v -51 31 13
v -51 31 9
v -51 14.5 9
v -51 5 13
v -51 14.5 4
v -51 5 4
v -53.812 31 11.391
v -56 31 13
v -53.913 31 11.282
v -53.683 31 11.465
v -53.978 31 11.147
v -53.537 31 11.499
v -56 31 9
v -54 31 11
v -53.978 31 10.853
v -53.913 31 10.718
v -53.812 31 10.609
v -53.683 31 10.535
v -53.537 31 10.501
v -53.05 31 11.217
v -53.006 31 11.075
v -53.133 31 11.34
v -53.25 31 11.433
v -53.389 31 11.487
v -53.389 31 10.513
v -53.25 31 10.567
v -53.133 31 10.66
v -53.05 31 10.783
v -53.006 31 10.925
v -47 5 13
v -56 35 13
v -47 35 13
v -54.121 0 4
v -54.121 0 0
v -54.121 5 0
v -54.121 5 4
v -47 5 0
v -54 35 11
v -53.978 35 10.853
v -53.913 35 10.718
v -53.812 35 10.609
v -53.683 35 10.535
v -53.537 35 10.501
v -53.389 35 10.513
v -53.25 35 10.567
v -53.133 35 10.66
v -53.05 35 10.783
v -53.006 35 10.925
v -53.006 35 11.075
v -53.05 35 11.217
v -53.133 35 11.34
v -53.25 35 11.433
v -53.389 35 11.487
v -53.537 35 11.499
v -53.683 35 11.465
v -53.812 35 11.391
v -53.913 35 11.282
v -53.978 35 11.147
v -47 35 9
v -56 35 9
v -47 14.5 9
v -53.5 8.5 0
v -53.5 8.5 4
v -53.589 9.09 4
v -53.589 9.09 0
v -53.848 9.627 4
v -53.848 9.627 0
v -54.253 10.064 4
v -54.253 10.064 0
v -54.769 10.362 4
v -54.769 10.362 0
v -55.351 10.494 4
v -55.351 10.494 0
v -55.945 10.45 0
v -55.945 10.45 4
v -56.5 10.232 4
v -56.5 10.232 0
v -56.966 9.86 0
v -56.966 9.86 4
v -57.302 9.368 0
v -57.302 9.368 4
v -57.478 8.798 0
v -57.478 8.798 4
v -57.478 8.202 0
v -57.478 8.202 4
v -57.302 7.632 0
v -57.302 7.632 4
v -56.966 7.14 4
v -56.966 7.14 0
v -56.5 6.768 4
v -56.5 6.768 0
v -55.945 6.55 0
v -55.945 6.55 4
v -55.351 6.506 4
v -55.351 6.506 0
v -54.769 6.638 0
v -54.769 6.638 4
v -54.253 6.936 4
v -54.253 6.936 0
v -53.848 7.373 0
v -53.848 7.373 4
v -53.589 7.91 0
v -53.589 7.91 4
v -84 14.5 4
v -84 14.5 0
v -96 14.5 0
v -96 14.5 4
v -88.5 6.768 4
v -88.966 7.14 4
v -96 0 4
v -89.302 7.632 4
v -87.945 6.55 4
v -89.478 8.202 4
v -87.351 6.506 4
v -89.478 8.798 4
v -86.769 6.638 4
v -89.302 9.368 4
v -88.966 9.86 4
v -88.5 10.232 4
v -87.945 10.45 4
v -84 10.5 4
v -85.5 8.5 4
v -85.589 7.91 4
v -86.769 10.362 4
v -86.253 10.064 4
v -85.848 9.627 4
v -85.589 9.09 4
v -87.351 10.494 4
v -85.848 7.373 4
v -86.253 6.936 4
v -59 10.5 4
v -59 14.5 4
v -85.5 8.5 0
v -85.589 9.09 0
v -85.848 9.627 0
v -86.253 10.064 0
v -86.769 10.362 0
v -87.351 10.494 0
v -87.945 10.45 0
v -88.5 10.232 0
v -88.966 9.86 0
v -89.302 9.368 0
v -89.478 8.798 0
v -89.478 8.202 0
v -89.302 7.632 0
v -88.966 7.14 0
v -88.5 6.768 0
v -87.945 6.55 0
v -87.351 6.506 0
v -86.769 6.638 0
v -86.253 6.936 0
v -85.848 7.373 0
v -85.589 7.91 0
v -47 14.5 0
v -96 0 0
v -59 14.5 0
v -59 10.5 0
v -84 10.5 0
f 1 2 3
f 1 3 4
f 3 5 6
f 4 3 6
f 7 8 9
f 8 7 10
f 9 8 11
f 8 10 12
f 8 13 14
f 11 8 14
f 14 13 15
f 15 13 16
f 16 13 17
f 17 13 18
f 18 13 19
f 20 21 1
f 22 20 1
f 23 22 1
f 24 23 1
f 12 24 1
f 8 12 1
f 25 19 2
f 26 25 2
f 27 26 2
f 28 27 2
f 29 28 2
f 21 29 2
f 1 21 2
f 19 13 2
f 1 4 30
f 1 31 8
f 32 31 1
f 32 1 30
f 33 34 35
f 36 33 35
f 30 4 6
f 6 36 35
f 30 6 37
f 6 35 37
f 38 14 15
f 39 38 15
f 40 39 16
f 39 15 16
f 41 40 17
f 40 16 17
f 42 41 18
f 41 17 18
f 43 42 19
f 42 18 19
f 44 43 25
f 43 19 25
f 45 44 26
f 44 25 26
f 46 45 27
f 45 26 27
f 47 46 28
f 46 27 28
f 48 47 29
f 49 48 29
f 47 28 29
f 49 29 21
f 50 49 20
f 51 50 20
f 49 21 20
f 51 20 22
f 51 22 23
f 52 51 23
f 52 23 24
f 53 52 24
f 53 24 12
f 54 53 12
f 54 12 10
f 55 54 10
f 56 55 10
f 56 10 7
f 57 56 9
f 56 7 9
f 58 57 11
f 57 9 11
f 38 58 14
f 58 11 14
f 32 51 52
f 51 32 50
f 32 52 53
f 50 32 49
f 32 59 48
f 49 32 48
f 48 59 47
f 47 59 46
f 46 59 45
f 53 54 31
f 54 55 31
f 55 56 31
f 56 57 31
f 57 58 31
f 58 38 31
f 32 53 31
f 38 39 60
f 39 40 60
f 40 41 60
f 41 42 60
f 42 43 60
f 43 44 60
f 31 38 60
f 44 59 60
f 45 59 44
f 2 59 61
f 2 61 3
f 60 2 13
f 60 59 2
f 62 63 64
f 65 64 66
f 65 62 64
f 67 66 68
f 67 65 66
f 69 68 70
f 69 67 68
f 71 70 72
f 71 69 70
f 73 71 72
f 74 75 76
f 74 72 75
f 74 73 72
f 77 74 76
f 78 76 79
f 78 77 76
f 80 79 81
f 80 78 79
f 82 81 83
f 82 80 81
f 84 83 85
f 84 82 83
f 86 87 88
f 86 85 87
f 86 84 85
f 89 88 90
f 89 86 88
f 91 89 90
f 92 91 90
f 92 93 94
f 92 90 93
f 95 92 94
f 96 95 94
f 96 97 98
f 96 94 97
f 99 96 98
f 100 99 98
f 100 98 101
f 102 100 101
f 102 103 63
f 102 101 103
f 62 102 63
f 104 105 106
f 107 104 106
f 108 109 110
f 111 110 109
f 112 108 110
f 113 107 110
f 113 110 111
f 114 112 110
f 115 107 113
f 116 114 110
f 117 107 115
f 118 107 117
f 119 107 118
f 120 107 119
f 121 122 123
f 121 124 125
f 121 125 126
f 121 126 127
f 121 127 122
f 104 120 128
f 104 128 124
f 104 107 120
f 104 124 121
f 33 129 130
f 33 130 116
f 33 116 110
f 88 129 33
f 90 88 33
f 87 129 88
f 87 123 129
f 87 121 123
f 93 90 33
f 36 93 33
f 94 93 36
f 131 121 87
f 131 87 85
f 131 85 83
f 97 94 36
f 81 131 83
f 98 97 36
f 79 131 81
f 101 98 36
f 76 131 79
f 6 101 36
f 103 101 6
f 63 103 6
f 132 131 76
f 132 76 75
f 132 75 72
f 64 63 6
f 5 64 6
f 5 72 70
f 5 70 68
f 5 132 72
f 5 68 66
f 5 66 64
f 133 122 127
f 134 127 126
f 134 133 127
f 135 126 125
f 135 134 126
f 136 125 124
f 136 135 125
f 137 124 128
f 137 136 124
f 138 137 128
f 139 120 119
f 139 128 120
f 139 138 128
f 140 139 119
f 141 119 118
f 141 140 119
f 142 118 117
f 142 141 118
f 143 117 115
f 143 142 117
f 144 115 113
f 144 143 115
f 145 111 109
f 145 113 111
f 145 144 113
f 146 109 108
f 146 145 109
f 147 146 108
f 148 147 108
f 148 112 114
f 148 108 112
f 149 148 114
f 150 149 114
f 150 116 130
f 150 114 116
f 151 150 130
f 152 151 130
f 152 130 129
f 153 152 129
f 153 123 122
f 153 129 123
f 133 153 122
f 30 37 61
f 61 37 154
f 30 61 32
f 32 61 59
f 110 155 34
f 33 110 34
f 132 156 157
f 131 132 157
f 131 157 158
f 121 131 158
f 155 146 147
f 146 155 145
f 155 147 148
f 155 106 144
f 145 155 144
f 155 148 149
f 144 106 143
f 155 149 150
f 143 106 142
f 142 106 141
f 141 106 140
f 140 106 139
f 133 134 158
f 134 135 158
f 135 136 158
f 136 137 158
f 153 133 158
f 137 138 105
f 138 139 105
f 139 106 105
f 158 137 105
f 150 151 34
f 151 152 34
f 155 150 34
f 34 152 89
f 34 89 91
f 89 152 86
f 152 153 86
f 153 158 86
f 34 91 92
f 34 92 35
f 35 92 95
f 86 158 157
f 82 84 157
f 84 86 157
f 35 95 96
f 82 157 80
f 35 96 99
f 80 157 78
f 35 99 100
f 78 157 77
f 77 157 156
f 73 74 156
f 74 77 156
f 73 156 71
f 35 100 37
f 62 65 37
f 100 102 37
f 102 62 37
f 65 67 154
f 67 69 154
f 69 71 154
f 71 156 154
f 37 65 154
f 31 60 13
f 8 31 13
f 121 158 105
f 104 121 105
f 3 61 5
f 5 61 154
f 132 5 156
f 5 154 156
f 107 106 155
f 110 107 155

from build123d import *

# Parameters (mm, degrees)
SKETCH1_R           = 2
BOSS_EXTRUDE1_DEPTH = 13
CUT_EXTRUDE2_DEPTH  = 9
CUT_EXTRUDE3_DEPTH  = 9
SKETCH7_R           = 0.5
CUT_EXTRUDE4_DEPTH  = 4


with BuildPart() as part:
    # Sketch1 → Boss-Extrude1 (new body)
    with BuildSketch(Plane.XY):
        Polygon((-96, 0), (-54.120862841, 0), (-54.120862841, 5), (-47, 5), (-47, 14.5), (-47, 35), (-51, 35), (-56, 35), (-56, 31), (-51, 31), (-51, 14.5), (-59, 14.5), (-59, 10.5), (-84, 10.5), (-84, 14.5), (-96, 14.5), align=None)
        with Locations((-87.5, 8.5)):
            Circle(SKETCH1_R, mode=Mode.SUBTRACT)
        with Locations((-55.5, 8.5)):
            Circle(SKETCH1_R, mode=Mode.SUBTRACT)
    extrude(amount=BOSS_EXTRUDE1_DEPTH)

    # Sketch5 → Cut-Extrude2 (cut)
    with BuildSketch(Plane.XY.offset(13)):
        Polygon((-84, 14.5), (-96, 14.5), (-96, 0), (-54.120862841, 0), (-54.120862841, 5), (-51, 5), (-51, 14.5), (-59, 14.5), (-59, 10.5), (-84, 10.5), align=None)
    extrude(amount=-CUT_EXTRUDE2_DEPTH, mode=Mode.SUBTRACT)

    # Sketch6 → Cut-Extrude3 (cut)
    with BuildSketch(Plane(origin=(0, 0, 0), x_dir=(-1, 0, 0), z_dir=(0, 0, -1))):
        Polygon((51, 31), (56, 31), (56, 35), (47, 35), (47, 14.5), (51, 14.5), align=None)
    extrude(amount=-CUT_EXTRUDE3_DEPTH, mode=Mode.SUBTRACT)

    # Sketch7 → Cut-Extrude4 (cut)
    with BuildSketch(Plane(origin=(0, 31, 0), x_dir=(-1, 0, 0), z_dir=(0, -1, 0))):
        with Locations((53.5, -11)):
            Circle(SKETCH7_R)
    extrude(amount=-CUT_EXTRUDE4_DEPTH, mode=Mode.SUBTRACT)


solid = part.part
